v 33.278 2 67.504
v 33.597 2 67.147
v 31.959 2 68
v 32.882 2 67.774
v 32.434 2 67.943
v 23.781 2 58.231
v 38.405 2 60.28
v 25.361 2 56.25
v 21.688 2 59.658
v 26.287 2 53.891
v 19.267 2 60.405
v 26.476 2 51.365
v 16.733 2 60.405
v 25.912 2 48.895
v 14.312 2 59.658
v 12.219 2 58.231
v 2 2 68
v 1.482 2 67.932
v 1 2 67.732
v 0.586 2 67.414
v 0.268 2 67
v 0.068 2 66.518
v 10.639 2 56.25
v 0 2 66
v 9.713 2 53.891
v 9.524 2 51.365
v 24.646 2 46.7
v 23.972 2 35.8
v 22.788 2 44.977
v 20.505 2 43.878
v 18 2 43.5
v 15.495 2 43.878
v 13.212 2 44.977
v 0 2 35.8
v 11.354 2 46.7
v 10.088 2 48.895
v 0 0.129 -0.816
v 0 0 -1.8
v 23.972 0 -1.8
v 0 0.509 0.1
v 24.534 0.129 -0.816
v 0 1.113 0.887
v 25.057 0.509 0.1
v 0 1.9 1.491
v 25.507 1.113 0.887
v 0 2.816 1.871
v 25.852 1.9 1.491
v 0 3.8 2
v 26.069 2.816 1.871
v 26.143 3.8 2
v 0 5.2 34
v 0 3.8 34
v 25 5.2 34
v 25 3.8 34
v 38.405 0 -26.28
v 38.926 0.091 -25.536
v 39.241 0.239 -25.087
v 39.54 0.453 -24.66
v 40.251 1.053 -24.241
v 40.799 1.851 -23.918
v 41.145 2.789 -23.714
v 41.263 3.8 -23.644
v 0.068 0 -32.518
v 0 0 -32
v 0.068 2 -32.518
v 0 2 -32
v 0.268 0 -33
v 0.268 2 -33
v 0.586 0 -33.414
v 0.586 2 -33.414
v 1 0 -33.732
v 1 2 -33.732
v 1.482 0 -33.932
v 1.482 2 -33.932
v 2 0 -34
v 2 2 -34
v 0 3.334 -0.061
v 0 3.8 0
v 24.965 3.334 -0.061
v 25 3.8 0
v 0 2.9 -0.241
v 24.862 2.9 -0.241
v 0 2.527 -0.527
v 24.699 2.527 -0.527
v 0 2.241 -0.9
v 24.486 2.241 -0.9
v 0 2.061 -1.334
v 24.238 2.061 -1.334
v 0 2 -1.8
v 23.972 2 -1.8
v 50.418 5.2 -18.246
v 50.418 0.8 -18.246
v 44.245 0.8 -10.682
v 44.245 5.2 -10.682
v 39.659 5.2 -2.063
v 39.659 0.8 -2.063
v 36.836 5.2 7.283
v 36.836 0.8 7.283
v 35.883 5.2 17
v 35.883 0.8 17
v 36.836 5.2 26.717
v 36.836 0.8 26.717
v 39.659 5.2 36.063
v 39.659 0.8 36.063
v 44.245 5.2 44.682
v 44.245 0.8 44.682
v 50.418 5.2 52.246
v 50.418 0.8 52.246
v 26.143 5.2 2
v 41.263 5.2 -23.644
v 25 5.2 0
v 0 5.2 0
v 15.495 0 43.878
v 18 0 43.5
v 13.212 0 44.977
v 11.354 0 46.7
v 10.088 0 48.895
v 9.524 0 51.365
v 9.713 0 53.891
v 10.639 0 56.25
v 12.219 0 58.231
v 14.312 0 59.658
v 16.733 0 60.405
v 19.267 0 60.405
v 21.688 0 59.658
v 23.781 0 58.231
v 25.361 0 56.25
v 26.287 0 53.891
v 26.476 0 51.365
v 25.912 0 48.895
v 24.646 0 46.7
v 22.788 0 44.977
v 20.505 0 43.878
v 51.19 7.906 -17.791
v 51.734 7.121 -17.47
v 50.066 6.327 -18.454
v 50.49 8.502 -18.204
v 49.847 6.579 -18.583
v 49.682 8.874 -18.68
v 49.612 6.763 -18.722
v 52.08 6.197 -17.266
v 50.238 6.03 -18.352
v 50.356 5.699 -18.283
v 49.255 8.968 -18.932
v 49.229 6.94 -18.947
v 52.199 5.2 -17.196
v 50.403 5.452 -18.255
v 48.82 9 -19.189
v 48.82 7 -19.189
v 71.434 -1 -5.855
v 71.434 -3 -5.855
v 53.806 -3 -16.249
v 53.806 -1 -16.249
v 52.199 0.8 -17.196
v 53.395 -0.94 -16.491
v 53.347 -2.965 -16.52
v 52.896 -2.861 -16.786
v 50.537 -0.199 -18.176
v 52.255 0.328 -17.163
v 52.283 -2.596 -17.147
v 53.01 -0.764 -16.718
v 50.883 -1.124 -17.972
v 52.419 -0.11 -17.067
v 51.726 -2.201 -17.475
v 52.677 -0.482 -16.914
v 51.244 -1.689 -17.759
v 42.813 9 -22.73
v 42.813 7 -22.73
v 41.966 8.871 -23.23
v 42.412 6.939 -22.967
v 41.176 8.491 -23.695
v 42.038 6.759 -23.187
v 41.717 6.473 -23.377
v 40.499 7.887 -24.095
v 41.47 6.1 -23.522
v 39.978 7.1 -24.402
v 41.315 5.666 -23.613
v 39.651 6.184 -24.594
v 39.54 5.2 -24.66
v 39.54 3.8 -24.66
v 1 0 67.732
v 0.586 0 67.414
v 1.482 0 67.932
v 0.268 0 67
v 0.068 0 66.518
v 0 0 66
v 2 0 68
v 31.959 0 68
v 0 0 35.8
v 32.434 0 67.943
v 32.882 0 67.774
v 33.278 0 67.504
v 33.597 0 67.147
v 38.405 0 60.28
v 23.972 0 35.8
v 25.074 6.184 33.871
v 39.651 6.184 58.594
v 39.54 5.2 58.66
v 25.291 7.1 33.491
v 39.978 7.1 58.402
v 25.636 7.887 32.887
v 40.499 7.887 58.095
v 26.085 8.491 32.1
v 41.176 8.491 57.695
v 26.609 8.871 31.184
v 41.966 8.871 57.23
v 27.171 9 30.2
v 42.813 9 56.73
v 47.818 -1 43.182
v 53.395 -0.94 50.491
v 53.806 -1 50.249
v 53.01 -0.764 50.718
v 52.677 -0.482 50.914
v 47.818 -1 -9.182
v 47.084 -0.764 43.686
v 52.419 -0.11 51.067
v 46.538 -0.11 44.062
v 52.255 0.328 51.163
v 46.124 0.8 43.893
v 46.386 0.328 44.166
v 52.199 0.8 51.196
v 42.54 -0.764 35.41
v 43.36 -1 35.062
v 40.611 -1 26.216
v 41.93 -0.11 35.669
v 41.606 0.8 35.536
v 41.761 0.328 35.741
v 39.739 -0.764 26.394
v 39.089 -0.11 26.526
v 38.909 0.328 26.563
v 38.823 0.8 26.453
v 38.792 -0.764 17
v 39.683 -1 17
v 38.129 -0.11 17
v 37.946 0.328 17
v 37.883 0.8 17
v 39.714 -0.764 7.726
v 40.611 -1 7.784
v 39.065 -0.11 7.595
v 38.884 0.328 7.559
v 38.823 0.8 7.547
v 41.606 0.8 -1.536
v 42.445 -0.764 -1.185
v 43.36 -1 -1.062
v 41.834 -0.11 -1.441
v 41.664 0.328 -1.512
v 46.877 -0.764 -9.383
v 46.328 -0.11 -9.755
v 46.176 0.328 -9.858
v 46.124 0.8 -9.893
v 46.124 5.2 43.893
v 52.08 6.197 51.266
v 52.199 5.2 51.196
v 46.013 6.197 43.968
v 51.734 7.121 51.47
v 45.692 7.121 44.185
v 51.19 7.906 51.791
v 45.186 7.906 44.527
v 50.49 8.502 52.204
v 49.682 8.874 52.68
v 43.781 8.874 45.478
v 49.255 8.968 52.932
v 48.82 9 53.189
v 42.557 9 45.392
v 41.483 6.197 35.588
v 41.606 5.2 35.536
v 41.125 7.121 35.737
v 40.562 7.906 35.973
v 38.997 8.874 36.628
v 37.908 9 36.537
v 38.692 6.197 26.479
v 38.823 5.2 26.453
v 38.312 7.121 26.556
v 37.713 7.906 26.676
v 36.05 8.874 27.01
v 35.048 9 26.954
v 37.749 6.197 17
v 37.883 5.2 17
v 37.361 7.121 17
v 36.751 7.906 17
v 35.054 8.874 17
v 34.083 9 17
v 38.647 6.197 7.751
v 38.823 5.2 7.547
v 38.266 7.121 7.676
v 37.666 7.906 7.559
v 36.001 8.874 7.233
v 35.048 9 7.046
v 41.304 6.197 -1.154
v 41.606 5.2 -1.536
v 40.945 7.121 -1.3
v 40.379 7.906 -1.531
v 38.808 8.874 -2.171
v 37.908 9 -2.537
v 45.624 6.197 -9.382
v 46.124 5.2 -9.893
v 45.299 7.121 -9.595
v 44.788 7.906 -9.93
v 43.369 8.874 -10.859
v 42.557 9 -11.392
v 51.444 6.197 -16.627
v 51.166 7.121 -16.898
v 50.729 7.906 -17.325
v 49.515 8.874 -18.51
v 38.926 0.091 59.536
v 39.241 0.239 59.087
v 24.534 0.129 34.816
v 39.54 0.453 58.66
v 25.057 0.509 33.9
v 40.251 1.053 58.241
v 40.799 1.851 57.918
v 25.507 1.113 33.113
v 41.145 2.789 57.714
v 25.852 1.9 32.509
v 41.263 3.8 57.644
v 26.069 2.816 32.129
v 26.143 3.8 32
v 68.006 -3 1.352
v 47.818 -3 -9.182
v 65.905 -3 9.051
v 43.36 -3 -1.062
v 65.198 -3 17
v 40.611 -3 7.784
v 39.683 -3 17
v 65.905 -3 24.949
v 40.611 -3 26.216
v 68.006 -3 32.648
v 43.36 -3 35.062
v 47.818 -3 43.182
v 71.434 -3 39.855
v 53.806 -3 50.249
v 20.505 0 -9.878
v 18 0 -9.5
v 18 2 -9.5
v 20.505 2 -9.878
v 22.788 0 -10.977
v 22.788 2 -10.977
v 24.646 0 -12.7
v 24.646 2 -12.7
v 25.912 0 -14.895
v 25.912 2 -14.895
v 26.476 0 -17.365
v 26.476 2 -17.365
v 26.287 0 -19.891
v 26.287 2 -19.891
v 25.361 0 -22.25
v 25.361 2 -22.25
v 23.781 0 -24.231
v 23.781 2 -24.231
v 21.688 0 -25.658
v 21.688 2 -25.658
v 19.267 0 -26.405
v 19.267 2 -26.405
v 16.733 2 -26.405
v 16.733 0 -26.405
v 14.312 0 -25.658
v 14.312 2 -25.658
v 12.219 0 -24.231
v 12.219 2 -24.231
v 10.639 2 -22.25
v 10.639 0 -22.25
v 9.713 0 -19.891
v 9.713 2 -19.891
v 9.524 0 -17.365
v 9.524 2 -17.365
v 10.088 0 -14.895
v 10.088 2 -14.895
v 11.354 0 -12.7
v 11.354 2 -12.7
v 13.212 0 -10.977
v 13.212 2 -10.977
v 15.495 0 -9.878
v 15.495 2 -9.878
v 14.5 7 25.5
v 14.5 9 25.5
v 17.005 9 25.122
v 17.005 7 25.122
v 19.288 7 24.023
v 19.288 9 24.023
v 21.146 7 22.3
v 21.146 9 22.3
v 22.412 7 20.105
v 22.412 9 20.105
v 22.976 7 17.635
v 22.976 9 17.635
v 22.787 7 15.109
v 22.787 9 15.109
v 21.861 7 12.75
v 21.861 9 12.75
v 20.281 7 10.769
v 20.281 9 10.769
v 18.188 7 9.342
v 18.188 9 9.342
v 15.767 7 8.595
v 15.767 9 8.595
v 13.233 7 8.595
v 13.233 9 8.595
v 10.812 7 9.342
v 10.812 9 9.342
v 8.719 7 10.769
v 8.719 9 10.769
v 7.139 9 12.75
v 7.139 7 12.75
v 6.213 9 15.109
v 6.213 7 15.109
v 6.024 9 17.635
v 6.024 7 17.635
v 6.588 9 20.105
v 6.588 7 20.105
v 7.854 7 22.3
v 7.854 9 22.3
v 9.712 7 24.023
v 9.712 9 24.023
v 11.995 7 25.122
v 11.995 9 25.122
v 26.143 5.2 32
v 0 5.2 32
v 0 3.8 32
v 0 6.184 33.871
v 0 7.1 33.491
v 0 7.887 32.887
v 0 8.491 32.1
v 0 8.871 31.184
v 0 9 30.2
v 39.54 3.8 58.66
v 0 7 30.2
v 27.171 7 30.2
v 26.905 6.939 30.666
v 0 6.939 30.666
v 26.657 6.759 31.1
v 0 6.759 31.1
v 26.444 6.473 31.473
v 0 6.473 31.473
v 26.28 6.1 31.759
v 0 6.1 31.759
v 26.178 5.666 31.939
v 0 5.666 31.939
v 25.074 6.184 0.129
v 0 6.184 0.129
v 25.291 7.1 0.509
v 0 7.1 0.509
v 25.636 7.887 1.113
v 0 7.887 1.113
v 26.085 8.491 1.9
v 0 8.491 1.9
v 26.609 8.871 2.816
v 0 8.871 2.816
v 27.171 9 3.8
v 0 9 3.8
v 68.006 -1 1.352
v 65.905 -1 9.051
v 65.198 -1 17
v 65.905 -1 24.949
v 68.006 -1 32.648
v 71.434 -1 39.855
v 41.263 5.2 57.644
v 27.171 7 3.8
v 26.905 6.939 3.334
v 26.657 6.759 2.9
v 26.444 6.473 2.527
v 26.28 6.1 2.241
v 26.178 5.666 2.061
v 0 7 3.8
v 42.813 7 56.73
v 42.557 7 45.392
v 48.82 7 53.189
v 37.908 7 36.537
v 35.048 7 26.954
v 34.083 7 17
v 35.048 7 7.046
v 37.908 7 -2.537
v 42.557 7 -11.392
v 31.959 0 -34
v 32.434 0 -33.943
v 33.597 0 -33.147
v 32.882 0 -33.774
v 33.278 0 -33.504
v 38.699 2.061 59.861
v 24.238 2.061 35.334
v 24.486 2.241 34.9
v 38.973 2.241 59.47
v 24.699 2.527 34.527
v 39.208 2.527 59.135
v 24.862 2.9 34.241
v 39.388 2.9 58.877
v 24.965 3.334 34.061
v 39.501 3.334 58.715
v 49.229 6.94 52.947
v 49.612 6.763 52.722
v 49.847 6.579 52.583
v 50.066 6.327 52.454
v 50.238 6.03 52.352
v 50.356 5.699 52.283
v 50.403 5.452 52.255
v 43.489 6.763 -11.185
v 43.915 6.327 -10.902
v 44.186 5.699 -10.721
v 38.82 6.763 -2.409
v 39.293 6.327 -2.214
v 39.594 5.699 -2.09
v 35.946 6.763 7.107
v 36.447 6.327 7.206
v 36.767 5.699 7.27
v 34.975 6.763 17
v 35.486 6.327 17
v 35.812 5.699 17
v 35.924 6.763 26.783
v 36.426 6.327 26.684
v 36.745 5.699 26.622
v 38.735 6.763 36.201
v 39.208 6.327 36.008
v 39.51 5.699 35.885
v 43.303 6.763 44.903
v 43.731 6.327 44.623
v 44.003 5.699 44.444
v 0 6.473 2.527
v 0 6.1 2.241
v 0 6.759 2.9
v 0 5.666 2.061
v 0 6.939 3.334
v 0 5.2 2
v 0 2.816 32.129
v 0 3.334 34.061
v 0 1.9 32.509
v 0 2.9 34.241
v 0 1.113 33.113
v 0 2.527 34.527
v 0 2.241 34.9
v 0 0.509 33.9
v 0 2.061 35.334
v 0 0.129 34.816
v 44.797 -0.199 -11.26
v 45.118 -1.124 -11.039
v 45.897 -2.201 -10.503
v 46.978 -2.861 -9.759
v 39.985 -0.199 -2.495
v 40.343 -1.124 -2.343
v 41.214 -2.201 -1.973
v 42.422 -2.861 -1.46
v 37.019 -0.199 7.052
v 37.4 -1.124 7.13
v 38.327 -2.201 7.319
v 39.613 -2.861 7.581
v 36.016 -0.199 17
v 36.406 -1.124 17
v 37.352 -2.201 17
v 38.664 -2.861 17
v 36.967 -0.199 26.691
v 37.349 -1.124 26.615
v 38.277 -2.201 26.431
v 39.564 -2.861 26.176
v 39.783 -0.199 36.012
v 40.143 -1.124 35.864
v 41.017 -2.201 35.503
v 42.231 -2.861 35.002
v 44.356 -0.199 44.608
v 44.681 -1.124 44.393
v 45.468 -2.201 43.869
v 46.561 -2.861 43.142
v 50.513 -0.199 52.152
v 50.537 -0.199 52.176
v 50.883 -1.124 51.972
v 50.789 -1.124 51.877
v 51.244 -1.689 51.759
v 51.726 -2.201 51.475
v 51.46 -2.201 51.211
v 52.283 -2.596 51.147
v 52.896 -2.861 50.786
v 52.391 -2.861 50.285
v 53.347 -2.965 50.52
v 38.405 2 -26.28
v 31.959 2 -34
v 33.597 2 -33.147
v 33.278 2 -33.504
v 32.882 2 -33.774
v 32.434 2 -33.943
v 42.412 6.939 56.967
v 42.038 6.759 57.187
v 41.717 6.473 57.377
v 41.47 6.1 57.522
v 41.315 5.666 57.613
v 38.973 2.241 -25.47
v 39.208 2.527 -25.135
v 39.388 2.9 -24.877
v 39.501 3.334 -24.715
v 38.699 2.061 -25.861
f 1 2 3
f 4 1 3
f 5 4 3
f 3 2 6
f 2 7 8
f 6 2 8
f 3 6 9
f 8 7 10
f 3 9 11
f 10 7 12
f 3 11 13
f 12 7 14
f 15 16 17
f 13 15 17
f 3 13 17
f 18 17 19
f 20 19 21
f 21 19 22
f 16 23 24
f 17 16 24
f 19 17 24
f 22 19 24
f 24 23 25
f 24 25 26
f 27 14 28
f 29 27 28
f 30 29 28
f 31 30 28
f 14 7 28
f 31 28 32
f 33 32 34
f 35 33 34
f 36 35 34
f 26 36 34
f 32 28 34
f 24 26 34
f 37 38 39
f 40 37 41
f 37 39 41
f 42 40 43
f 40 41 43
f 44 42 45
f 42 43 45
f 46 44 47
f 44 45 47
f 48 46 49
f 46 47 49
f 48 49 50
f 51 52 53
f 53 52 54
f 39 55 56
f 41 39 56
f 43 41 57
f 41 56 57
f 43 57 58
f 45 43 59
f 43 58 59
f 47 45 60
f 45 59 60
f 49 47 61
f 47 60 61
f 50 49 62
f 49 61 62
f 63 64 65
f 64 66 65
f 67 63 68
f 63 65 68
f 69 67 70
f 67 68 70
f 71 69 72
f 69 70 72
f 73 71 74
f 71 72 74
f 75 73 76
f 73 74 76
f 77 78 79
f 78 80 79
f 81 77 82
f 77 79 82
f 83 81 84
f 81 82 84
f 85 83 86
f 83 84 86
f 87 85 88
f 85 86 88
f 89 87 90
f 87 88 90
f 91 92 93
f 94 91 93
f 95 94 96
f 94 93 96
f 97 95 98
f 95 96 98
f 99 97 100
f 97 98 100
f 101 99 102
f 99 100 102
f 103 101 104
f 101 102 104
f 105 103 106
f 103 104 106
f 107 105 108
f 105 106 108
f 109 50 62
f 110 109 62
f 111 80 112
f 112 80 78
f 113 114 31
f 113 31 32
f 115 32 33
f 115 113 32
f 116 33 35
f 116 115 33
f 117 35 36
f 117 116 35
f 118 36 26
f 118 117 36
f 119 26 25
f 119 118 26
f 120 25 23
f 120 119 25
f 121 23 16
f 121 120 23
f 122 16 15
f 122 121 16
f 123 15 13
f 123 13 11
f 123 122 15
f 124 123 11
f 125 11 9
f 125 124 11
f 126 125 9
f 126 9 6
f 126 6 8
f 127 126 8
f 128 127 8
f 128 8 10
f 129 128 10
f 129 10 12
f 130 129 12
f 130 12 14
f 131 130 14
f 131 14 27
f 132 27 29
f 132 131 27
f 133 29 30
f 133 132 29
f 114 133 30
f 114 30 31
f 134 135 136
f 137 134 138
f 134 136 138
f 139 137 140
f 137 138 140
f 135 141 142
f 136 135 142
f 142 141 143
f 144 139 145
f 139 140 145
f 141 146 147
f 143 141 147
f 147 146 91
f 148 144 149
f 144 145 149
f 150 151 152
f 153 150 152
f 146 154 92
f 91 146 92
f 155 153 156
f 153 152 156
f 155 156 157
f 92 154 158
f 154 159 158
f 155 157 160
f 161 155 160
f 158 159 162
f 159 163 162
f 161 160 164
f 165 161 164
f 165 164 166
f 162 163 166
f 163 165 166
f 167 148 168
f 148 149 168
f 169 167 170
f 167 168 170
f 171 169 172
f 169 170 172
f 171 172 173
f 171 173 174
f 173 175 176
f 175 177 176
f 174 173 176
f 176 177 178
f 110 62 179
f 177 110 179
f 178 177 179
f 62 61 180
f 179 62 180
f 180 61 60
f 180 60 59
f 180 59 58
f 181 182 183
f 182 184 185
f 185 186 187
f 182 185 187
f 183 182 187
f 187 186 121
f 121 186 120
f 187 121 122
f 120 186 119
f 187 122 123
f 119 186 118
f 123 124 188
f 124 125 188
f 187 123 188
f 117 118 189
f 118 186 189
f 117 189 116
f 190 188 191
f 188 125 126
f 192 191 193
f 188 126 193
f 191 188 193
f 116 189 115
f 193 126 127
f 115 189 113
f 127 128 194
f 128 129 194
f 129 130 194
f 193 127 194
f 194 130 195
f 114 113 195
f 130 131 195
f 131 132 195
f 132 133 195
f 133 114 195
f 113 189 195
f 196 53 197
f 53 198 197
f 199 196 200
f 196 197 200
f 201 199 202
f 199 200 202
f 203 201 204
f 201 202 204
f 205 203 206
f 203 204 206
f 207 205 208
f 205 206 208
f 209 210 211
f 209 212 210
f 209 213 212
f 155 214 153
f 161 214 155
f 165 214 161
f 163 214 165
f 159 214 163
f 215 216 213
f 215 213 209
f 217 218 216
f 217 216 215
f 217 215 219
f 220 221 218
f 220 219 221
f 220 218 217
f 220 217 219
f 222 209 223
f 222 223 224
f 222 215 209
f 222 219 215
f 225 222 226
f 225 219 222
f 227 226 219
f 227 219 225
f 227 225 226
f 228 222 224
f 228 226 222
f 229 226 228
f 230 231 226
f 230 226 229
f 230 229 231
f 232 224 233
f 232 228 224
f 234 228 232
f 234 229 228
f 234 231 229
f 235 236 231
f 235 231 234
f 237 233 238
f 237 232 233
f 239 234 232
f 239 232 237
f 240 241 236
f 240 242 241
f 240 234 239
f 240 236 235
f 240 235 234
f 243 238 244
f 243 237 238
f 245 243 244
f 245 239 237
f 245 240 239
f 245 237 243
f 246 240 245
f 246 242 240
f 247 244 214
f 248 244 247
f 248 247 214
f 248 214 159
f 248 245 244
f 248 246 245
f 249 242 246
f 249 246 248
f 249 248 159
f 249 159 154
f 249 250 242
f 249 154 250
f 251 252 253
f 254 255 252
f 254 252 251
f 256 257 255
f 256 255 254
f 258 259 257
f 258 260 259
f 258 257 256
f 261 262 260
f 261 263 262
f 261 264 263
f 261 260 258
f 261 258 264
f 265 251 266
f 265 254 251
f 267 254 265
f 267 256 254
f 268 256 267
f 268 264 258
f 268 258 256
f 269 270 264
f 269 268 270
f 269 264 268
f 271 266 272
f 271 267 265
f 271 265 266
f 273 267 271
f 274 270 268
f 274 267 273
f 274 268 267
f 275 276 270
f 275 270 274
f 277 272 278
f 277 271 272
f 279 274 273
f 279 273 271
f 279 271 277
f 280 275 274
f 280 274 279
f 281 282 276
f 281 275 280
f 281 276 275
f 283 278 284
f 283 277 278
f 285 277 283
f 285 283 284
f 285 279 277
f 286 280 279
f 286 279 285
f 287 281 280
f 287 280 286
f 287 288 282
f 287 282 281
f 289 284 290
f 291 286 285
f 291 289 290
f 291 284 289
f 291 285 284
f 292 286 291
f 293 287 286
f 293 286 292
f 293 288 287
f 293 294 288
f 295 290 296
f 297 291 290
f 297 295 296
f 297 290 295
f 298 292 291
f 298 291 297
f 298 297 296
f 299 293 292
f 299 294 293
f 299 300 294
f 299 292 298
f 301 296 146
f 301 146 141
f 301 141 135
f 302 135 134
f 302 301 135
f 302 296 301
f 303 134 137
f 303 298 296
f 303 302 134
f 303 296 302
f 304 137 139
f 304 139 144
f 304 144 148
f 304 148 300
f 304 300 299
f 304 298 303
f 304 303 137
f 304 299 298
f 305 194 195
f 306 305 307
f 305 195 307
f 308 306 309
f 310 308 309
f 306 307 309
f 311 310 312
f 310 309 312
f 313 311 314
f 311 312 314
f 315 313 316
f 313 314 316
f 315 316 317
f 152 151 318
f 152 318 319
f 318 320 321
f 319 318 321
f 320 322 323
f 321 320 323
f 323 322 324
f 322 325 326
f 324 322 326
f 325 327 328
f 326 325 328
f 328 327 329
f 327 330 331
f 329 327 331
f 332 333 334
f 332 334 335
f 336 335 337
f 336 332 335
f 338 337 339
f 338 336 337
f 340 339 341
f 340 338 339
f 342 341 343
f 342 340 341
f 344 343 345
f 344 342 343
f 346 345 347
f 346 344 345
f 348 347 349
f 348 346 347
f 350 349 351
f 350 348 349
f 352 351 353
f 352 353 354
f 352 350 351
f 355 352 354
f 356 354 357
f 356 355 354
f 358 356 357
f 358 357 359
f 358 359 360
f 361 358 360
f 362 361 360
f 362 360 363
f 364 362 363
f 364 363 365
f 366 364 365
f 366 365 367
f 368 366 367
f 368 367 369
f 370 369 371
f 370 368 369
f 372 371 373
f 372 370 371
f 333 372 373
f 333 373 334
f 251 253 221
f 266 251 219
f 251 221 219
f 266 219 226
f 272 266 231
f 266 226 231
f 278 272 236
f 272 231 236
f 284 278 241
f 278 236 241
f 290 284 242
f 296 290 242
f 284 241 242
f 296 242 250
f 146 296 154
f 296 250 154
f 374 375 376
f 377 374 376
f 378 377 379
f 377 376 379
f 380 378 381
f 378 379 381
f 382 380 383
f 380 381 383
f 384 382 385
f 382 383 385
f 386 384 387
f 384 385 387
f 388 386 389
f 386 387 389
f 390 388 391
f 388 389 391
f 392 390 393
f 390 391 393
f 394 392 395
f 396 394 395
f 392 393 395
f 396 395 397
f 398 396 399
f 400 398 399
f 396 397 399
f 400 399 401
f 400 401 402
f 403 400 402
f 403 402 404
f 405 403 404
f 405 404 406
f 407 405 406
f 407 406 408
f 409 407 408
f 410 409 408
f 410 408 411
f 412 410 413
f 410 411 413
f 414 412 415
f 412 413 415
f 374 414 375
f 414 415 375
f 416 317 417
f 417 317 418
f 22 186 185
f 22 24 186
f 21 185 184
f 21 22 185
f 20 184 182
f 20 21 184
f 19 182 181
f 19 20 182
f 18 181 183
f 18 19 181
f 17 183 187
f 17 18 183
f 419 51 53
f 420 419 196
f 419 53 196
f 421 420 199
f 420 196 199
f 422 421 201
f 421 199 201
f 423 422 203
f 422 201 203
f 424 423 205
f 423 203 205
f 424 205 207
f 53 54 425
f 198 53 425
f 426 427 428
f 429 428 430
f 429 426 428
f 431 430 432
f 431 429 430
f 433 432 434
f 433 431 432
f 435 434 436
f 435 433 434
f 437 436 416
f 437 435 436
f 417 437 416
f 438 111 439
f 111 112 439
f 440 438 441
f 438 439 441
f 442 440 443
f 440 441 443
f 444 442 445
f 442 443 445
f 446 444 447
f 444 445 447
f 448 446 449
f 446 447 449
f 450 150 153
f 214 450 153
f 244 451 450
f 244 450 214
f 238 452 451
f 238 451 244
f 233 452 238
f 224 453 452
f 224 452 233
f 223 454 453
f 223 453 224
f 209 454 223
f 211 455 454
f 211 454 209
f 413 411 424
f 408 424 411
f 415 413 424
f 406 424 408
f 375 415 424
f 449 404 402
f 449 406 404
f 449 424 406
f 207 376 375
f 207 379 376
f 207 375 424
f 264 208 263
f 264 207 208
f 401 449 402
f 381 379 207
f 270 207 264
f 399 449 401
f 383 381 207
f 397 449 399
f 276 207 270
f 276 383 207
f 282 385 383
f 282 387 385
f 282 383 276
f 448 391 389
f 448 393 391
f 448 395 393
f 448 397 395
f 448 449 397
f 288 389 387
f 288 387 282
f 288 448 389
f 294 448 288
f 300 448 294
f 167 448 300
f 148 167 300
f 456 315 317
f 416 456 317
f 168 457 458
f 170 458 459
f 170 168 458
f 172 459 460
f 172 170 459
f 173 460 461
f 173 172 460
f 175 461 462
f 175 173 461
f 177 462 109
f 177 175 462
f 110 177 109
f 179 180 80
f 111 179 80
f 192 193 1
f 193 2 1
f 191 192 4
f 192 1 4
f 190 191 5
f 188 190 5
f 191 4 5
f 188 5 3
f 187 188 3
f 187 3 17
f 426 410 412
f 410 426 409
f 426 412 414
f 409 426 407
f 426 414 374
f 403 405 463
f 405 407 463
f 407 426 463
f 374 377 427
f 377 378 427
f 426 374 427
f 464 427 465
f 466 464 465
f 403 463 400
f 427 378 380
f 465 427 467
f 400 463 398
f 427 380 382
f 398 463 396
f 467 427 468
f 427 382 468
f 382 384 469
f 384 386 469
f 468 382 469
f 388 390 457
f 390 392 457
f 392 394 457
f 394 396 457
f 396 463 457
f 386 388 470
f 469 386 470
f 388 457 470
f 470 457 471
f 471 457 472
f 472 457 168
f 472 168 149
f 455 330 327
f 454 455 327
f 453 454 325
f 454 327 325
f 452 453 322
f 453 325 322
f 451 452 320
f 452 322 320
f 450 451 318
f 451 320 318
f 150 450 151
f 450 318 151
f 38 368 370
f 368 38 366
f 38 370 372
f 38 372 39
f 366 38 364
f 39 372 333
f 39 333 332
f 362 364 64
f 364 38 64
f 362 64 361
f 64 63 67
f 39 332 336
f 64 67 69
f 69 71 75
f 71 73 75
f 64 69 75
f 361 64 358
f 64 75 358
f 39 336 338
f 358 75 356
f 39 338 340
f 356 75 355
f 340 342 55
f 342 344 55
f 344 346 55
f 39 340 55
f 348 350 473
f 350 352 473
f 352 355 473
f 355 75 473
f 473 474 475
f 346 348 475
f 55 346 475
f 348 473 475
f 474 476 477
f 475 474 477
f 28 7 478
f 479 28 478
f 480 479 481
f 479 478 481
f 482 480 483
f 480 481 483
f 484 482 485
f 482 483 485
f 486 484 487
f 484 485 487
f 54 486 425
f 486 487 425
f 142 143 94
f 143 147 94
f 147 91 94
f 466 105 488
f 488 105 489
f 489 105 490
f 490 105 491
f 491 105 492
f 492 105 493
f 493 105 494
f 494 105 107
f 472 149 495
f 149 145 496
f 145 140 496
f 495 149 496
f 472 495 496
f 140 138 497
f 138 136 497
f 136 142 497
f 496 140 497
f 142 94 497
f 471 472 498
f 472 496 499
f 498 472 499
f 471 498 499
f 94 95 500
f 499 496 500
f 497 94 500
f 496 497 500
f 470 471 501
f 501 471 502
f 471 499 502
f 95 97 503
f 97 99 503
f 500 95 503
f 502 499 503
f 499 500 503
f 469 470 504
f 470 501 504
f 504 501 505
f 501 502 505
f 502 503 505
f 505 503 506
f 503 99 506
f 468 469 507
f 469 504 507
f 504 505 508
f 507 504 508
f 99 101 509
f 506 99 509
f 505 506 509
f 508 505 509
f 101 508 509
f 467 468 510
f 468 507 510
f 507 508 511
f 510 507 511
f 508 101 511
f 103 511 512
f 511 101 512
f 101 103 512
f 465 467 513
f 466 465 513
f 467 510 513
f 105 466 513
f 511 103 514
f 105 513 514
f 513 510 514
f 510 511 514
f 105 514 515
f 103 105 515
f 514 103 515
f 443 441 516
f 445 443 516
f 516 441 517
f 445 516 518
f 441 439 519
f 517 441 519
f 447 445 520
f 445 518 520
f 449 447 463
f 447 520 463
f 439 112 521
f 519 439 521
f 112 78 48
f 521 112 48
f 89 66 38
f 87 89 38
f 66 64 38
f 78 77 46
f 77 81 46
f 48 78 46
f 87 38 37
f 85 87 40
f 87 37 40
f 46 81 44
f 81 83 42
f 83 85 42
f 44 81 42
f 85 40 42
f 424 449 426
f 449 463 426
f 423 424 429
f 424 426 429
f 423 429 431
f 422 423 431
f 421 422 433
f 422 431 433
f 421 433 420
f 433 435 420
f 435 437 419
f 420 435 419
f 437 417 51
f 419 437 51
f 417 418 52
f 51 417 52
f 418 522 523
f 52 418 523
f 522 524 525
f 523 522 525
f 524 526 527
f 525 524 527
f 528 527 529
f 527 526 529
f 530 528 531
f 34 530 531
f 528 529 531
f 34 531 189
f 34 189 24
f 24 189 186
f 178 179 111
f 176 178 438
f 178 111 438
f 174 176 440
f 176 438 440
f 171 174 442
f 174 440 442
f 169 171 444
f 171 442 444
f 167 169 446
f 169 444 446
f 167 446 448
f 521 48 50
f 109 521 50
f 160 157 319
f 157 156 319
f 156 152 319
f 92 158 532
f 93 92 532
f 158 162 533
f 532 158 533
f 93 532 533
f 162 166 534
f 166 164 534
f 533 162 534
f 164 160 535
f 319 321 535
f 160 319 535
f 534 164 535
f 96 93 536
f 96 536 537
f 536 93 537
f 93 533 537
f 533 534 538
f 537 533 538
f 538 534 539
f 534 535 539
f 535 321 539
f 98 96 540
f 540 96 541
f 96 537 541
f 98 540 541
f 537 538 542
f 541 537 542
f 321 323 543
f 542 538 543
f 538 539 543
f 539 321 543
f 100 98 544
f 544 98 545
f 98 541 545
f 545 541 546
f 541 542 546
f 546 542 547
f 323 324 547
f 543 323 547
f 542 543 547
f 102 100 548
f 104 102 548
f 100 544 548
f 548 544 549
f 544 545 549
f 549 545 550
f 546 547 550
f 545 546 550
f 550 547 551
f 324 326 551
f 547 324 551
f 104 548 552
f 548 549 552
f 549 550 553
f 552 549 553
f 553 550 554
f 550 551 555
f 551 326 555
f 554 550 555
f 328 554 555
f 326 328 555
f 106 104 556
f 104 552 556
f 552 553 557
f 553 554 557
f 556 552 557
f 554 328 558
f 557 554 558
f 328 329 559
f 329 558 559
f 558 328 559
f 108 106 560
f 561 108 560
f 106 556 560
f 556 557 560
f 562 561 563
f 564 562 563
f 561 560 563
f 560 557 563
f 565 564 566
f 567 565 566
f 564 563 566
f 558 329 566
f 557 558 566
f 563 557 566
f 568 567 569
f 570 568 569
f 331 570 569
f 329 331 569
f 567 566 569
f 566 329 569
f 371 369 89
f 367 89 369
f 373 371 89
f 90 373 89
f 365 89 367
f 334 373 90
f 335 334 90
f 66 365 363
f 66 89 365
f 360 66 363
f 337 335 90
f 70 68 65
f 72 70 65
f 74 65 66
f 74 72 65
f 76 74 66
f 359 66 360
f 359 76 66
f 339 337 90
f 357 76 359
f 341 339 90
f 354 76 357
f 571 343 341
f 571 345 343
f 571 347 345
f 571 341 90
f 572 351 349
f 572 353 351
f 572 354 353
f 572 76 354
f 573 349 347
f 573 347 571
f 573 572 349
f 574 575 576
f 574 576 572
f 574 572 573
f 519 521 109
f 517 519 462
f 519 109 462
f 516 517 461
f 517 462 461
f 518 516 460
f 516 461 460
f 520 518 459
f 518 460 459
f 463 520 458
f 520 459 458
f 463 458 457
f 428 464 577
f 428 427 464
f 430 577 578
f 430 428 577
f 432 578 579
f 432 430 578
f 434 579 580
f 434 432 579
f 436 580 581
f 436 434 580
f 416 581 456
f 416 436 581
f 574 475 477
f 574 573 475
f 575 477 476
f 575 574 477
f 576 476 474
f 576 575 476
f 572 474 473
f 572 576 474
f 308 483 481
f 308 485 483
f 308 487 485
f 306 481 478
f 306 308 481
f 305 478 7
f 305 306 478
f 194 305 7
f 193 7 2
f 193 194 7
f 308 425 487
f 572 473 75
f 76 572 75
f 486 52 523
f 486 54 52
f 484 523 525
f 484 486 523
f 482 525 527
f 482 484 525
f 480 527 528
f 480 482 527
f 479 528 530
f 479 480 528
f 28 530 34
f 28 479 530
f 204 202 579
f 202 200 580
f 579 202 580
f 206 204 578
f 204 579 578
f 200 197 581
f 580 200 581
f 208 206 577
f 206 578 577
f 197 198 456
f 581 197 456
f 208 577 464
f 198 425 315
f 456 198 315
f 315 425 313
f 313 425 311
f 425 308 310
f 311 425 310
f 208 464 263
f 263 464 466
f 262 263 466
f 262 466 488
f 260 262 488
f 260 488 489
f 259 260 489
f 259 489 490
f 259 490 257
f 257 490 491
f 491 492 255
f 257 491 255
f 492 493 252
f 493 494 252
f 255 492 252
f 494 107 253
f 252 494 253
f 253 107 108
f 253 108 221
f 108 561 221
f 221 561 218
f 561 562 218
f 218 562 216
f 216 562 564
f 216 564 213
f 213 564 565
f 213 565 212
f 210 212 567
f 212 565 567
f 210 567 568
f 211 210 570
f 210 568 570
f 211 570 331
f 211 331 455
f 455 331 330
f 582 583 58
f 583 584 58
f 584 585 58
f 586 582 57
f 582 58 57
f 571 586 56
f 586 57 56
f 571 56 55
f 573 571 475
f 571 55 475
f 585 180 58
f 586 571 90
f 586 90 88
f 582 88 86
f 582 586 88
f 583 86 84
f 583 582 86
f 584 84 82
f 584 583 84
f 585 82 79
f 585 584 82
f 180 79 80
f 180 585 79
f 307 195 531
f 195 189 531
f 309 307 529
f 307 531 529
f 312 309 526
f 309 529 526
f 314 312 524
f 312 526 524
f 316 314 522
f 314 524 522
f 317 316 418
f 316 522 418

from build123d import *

# Parameters (mm, degrees)
SKETCH_1_R           = 8.5
EXTRUDE_1_DEPTH      = 2
EXTRUDE_1_2_DEPTH    = 2
EXTRUDE_7_DEPTH      = 5
EXTRUDE_7_DEPTH_BACK = 2
EXTRUDE_8_DEPTH      = 2
FILLET_1_R           = 3.8
FILLET_2_R           = 1.8
SKETCH_5_R           = 8.500000000000004
CUT_EXTRUDE_1_DEPTH  = 2
EXTRUDE_START        = 8
EXTRUDE_9_DEPTH      = 8
EXTRUDE_START_2      = 2
EXTRUDE_10_DEPTH     = 2
FILLET_3_R           = 1.8
FILLET_4_R           = 3.8
FILLET_5_R           = 2


with BuildPart() as part:
    # Эскиз1 → Бобышка-Вытянуть1 (new body)
    with BuildSketch(Plane(origin=(0, 0, 0), x_dir=(1, 0, 0), z_dir=(0, 1, 0))):
        Polygon((0, 0), (25, 0), (39.53977757143407, 24.66022969681975), (33, 34), (0, 34), align=None)
        with Locations(Location((18, 18.000000000000004, 0), (0, 0, 270))):
            Circle(SKETCH_1_R, mode=Mode.SUBTRACT)
    extrude(amount=EXTRUDE_1_DEPTH)



with BuildPart() as body_2:
    # Эскиз1 → Extrude 1 2 (new body)
    with BuildSketch(Plane(origin=(0, 0, 0), x_dir=(1, 0, 0), z_dir=(0, 1, 0))):
        Polygon((39.539777571434044, -58.66022969681975), (32.99999999999997, -68), (-1.388e-14, -68), (-1.388e-14, -34), (24.999999999999975, -34), align=None)
        with Locations(Location((17.99999999999997, -52.00000000000001, 0), (0, 0, 90))):
            Circle(SKETCH_1_R, mode=Mode.SUBTRACT)
    extrude(amount=EXTRUDE_1_2_DEPTH)


with BuildPart() as part_1:
    add(part.part)

    add(body_2.part)  # Бобышка-Вытянуть7 merges body 2
    # Эскиз2 → Бобышка-Вытянуть7 (add, two sides: drawn at the far end of the back side and taken through both)
    with BuildSketch(Plane(origin=(0, 2, 0), x_dir=(1, 0, 0), z_dir=(0, 1, 0)).offset(-EXTRUDE_7_DEPTH_BACK)):
        Polygon((0, 0), (2.4e-16, -2), (26.142543519238394, -1.9999999999999973), (41.262614368883476, 23.64443770563539), (39.53977757143407, 24.66022969681975), (25, 0), align=None)
        Polygon((-1.388e-14, -34), (24.999999999999975, -34), (39.539777571434044, -58.66022969681975), (41.26261436888351, -57.644437705635355), (26.142543519238462, -32), (0, -32), align=None)
    extrude(amount=EXTRUDE_7_DEPTH + EXTRUDE_7_DEPTH_BACK)

    # Эскиз4 → Бобышка-Вытянуть8 (add)
    with BuildSketch(Plane(origin=(0, 7, 0), x_dir=(1, 0, 0), z_dir=(0, 1, 0))):
        with BuildLine():
            Line((-1.388e-14, -34), (24.999999999999922, -34.00000000000004))
            Line((24.999999999999922, -34.00000000000004), (39.539777571434044, -58.66022969681975))
            Line((39.539777571434044, -58.66022969681975), (52.19877033120313, -51.196433079013936))
            ThreePointArc((52.19877033120313, -51.196433079013936), (37.882653193375084, -16.999999999999993), (52.19877033120313, 17.196433079013932))
            Line((52.19877033120313, 17.196433079013932), (39.539777571434044, 24.660229696819748))
            Line((39.539777571434044, 24.660229696819748), (24.999999999999982, 0))
            Line((24.999999999999982, 0), (-1.388e-14, 0))
            Line((-1.388e-14, 0), (-1.388e-14, -34))
        make_face()
    extrude(amount=EXTRUDE_8_DEPTH)

    # Скругление1
    fillet_1_edges = [part_1.edges().sort_by_distance(p)[0] for p in [
        (33.70257894406093, 0, -10.822218852817695),
        (33.70257894406099, 0, 44.82221885281768),
        (32.26988878571699, 9, 46.33011484840989),
        (12.499999999999954, 9, 34.00000000000002),
        (32.269888785717015, 9, -12.330114848409874),
        (12.499999999999984, 9, 0),
        (13.071271759619231, 0, 32),
        (13.071271759619197, 0, 1.9999999999999987),
    ]]
    fillet(fillet_1_edges, radius=FILLET_1_R)

    # Скругление2
    fillet_2_edges = [part_1.edges().sort_by_distance(p)[0] for p in [
        (32.269888785717036, 2, -12.330114848409876),
        (13.071271759619197, 7, 1.9999999999999987),
        (33.70257894406093, 7, -10.822218852817695),
        (32.26988878571701, 2, 46.33011484840988),
        (12.49999999999998, 2, 34),
        (33.70257894406099, 7, 44.82221885281768),
        (13.071271759619231, 7, 32),
        (12.5, 2, 0),
    ]]
    fillet(fillet_2_edges, radius=FILLET_2_R)

    # Эскиз5 → Вырез-Вытянуть1 (cut)
    with BuildSketch(Plane(origin=(0, 9.000000000000002, 0), x_dir=(1, 0, 0), z_dir=(0, 1, 0))):
        with Locations(Location((14.500000000000002, -17, 0), (0, 0, 270))):
            Circle(SKETCH_5_R)
    extrude(amount=-CUT_EXTRUDE_1_DEPTH, mode=Mode.SUBTRACT)

    # Эскиз6 → Бобышка-Вытянуть9 (add)
    with BuildSketch(Plane.XZ.offset(-7).offset(EXTRUDE_START)):
        with BuildLine():
            Line((52.19877033120314, -17.19643307901394), (50.41843679588763, -18.246125394320746))
            ThreePointArc((50.41843679588763, -18.246125394320746), (35.882653193375084, 17.000000000000007), (50.41843679588763, 52.24612539432075))
            Line((50.41843679588763, 52.24612539432075), (52.19877033120313, 51.196433079013936))
            ThreePointArc((52.19877033120313, 51.196433079013936), (37.882653193375084, 16.999999999999986), (52.19877033120314, -17.19643307901394))
        make_face()
    extrude(amount=-EXTRUDE_9_DEPTH)

    # Эскиз7 → Бобышка-Вытянуть10 (add)
    with BuildSketch(Plane.XZ.offset(1).offset(EXTRUDE_START_2)):
        with BuildLine():
            Line((50.41843679588763, 52.24612539432075), (71.4338966640132, 39.85531980164811))
            ThreePointArc((71.4338966640132, 39.85531980164811), (65.19772460662475, 17.000000000000007), (71.43389666401319, -5.8553198016480925))
            Line((71.43389666401319, -5.8553198016480925), (50.418436795887615, -18.24612539432073))
            ThreePointArc((50.418436795887615, -18.24612539432073), (35.882653193375084, 17.000000000000007), (50.41843679588763, 52.24612539432075))
        make_face()
    extrude(amount=-EXTRUDE_10_DEPTH)

    # Скругление3
    fillet_3_edges = [part_1.edges().sort_by_distance(p)[0] for p in [
        (35.88265319337508, 7, 17.000000000000007),
        (37.88265319337509, -1, 16.999999999999996),
    ]]
    fillet(fillet_3_edges, radius=FILLET_3_R)

    # Скругление4
    fillet_4_edges = [part_1.edges().sort_by_distance(p)[0] for p in [
        (35.88265319337508, -3, 17.000000000000014),
        (37.882653193375084, 9, 17.000000000000004),
    ]]
    fillet(fillet_4_edges, radius=FILLET_4_R)

    # Скругление5
    fillet_5_edges = [part_1.edges().sort_by_distance(p)[0] for p in [
        (-1.388e-14, 1, 68),
        (32.99999999999997, 1, 68),
        (0, 1, -34),
        (33, 1, -34),
    ]]
    fillet(fillet_5_edges, radius=FILLET_5_R)


solid = part_1.part
